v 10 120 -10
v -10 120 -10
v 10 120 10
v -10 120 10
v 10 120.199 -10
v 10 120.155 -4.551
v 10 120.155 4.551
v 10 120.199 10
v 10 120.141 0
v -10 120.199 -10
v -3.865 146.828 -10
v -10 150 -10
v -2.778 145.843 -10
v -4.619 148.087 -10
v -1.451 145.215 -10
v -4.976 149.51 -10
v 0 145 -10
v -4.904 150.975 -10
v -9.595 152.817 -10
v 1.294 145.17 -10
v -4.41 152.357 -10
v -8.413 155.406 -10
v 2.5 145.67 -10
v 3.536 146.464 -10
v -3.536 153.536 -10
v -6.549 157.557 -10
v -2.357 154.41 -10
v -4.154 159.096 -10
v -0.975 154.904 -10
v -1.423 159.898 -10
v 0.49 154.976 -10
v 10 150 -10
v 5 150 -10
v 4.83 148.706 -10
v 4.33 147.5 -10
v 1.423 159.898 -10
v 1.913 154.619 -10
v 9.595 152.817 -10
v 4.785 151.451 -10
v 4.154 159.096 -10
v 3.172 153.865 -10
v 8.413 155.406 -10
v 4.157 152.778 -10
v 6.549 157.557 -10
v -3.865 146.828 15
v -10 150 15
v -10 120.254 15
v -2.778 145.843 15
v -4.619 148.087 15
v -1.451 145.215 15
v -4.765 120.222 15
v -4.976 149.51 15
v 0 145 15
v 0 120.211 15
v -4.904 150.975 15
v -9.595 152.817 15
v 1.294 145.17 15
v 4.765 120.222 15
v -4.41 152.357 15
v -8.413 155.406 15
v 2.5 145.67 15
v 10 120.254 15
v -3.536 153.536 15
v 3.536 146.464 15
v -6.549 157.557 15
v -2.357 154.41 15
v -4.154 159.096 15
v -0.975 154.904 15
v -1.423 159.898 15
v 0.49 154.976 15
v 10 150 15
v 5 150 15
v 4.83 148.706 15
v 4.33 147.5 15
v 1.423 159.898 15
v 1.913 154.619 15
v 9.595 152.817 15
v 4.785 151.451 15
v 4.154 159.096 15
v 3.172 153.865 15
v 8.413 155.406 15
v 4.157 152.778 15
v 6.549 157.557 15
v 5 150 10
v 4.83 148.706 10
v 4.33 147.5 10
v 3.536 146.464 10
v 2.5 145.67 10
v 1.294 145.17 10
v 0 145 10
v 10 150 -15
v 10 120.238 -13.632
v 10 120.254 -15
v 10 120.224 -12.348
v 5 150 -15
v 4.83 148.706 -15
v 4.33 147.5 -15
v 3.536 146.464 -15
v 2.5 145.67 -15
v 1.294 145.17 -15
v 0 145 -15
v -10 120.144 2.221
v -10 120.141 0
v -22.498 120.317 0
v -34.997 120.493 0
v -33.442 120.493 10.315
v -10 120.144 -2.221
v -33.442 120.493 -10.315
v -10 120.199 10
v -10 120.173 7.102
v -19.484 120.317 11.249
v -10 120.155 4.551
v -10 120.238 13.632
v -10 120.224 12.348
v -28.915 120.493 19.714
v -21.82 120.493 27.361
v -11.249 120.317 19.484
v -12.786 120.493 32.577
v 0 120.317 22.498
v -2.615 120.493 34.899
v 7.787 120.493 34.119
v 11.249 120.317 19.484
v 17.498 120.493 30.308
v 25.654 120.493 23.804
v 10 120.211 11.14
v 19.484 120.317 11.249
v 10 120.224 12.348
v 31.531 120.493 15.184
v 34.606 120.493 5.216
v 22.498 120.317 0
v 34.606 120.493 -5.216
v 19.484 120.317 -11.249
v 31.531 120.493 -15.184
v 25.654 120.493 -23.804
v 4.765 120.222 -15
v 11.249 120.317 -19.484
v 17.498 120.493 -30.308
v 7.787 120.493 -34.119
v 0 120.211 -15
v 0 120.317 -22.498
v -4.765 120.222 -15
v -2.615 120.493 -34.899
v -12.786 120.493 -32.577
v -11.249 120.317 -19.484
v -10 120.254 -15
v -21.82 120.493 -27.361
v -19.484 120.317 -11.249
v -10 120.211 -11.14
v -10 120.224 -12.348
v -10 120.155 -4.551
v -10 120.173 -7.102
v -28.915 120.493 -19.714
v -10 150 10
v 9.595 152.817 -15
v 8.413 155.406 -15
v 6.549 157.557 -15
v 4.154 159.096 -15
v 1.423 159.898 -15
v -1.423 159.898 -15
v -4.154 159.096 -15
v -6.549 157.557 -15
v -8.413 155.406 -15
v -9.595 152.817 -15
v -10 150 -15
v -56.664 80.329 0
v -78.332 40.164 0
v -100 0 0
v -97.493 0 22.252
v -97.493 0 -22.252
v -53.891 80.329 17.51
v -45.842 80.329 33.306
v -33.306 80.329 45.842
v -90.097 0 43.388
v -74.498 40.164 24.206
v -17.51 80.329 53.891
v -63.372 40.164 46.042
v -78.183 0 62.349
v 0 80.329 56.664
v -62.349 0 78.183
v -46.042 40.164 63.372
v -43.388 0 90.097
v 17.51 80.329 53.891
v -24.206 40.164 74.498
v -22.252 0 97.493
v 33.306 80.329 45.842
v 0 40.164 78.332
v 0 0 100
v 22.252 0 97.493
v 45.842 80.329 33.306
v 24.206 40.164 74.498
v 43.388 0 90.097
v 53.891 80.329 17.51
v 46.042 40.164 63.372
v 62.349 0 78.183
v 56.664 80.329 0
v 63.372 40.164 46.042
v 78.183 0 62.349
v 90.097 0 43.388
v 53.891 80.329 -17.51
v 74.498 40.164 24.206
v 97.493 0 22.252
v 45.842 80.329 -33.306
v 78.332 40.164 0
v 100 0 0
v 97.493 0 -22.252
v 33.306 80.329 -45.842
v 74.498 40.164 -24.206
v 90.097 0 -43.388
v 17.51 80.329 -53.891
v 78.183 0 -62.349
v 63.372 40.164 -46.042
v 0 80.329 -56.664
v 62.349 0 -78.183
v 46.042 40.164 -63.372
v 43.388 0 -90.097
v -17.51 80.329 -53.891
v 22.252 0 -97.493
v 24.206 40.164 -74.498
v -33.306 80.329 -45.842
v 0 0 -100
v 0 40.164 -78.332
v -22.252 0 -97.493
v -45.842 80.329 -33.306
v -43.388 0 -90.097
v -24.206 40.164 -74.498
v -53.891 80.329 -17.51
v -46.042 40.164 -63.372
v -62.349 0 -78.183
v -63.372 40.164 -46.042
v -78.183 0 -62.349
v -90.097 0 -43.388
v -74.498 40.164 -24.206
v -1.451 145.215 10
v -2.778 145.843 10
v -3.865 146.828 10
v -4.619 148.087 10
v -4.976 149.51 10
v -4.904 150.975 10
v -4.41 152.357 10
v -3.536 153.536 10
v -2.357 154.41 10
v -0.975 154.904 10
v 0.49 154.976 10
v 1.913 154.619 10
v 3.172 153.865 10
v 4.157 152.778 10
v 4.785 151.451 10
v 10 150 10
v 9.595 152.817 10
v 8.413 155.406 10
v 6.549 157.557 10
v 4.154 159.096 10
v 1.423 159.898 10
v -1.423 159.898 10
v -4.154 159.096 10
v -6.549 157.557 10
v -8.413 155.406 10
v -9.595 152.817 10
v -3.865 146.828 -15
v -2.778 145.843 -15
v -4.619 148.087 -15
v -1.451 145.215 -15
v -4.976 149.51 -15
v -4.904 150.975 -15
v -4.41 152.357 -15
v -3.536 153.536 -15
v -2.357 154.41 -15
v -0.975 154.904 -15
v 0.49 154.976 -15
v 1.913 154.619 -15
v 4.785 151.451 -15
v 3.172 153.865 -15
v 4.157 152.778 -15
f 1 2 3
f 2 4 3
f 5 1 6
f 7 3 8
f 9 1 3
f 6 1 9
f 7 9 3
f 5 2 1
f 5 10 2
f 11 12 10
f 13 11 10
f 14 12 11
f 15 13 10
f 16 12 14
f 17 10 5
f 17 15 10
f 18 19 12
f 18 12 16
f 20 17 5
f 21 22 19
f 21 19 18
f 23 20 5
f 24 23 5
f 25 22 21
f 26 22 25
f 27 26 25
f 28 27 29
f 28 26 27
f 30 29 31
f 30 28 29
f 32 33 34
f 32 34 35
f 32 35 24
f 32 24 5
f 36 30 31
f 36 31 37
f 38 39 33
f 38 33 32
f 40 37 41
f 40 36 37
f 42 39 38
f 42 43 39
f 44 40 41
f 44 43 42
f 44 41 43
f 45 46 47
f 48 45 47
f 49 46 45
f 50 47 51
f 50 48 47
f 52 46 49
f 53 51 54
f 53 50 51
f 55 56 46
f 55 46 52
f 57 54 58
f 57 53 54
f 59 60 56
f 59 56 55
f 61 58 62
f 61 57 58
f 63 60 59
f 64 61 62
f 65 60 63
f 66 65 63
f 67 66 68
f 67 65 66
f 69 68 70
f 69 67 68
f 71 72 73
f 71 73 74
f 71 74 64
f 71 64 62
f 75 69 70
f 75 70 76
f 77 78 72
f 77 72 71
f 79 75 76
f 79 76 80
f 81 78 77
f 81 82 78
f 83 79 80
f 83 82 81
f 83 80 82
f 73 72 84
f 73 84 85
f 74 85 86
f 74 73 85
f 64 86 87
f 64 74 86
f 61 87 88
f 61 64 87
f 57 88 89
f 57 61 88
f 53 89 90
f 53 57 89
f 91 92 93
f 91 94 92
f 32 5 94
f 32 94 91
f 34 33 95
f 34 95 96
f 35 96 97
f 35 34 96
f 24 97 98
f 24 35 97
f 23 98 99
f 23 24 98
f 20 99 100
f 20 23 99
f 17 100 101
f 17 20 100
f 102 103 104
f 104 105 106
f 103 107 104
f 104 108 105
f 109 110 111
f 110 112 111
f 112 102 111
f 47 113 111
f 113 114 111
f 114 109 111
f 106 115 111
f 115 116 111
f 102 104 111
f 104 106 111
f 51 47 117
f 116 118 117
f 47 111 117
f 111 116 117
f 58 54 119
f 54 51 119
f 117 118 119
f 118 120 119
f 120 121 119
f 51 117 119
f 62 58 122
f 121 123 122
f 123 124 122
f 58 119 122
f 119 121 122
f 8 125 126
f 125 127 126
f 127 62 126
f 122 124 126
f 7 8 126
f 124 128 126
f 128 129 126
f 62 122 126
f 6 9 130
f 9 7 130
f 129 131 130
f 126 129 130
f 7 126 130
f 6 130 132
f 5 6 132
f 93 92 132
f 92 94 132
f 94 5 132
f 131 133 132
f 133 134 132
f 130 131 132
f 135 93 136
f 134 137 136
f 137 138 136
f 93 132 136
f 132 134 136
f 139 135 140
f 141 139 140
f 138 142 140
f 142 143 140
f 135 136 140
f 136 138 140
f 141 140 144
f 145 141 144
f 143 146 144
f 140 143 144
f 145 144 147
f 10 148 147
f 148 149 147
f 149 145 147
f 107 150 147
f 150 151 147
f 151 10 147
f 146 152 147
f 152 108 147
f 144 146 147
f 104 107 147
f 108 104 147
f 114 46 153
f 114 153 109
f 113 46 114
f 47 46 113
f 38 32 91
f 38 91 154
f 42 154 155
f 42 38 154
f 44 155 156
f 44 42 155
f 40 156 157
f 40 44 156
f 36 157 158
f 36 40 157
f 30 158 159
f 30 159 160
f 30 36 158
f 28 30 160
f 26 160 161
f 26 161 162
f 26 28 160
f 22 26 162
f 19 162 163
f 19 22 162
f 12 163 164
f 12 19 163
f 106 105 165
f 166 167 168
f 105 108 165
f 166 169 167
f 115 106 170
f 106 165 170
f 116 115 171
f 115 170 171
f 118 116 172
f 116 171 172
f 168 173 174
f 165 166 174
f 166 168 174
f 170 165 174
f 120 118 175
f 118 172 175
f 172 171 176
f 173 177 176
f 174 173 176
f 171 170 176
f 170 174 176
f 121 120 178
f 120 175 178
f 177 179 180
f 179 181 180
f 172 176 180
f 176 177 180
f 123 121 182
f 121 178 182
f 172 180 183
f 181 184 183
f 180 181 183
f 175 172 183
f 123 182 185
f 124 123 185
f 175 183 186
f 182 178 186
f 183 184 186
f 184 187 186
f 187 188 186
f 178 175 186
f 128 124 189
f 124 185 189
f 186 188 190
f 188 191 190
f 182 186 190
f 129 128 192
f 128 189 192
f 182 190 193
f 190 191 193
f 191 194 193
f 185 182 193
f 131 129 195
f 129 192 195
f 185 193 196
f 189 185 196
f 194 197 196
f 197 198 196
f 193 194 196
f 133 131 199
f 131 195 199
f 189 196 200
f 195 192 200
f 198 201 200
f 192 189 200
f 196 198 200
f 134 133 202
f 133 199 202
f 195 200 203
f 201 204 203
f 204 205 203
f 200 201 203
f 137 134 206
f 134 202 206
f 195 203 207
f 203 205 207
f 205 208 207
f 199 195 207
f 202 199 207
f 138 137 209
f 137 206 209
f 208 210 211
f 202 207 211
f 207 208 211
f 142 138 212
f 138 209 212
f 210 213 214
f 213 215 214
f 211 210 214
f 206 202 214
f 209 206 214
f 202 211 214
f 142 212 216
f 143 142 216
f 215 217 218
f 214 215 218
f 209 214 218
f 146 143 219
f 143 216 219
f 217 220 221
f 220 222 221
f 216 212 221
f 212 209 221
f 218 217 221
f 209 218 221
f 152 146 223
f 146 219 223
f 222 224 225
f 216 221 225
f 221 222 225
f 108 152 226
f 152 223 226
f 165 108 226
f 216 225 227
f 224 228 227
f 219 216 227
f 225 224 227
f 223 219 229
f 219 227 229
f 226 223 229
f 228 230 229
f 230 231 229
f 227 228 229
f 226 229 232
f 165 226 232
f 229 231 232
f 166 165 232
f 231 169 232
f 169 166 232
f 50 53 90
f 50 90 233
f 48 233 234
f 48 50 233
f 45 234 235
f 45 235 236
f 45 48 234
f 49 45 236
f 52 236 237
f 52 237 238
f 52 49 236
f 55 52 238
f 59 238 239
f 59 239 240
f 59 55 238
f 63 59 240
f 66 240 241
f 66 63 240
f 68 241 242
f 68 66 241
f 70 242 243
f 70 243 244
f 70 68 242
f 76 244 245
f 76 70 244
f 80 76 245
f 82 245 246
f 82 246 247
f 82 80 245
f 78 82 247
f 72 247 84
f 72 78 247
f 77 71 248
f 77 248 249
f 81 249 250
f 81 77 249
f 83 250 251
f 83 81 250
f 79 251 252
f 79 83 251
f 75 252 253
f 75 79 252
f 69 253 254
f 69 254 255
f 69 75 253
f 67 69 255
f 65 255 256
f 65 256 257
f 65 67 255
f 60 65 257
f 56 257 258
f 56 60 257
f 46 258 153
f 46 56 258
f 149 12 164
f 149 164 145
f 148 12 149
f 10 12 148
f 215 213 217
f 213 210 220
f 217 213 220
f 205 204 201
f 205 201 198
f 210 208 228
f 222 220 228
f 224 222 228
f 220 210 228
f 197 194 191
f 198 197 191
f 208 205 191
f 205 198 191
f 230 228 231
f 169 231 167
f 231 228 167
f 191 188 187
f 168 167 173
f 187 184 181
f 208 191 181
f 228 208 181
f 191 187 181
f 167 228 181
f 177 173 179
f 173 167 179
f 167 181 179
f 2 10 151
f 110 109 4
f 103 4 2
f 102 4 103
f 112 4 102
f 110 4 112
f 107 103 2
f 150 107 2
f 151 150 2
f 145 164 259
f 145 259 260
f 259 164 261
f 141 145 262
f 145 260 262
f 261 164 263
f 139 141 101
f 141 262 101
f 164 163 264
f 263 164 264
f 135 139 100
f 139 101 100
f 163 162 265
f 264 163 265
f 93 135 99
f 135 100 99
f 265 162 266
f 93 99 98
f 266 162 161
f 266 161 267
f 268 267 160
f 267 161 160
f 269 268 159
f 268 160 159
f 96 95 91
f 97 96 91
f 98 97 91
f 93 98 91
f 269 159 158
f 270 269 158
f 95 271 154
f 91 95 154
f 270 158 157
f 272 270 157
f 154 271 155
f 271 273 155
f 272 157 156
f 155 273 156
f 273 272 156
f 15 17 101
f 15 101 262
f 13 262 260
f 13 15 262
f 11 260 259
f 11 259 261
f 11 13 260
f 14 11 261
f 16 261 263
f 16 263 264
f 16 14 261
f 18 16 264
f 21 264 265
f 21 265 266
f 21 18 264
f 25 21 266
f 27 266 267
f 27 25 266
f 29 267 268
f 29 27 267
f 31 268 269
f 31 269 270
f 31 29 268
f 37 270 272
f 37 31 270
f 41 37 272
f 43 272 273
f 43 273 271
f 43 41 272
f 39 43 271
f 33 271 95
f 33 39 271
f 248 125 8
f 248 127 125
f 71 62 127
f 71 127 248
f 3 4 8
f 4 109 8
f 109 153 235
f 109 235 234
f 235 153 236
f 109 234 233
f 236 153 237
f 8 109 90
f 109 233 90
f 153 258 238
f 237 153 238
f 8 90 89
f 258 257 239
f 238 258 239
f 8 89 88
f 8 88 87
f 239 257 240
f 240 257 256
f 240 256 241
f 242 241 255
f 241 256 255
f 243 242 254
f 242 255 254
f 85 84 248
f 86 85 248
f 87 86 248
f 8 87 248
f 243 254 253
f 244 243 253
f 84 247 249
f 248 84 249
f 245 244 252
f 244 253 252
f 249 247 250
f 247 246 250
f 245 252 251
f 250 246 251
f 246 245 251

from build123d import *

# Parameters (mm, degrees)
F3_DEPTH = 15
F5_DEPTH = 10


with BuildPart() as f1:
    # F0 (on Top) → F1 (revolve)
    with BuildSketch(Plane.XY):
        Polygon((-100, 0), (0, 0), (0, 120), (-34.996529, 120.492912), align=None)
    revolve(axis=Axis((0, 60, 0), (0, 1, 0)))

    # F2 (on Top) → F3 (join, symmetric)
    with BuildSketch(Plane.XY):
        with BuildLine():
            ThreePointArc((5, 150), (-3.535534, 153.535534), (0, 145))
            ThreePointArc((0, 145), (3.535534, 146.464466), (5, 150))
        make_face()
        with BuildLine():
            Line((-10, 120), (0, 120))
            Line((0, 120), (10, 120))
            Line((10, 120), (10, 150))
            ThreePointArc((10, 150), (0, 160), (-10, 150))
            Line((-10, 150), (-10, 120))
        make_face()
        with BuildLine():
            ThreePointArc((5, 150), (3.535534, 146.464466), (0, 145))
            ThreePointArc((0, 145), (-3.535534, 153.535534), (5, 150))
        make_face(mode=Mode.SUBTRACT)
    extrude(amount=F3_DEPTH, both=True)

    # F4 (on Top) → F5 (cut, symmetric)
    with BuildSketch(Plane.XY):
        with BuildLine():
            ThreePointArc((5, 150), (-3.535534, 153.535534), (0, 145))
            ThreePointArc((0, 145), (3.535534, 146.464466), (5, 150))
        make_face()
        with BuildLine():
            Line((-10, 120), (0, 120))
            Line((0, 120), (10, 120))
            Line((10, 120), (10, 150))
            ThreePointArc((10, 150), (0, 160), (-10, 150))
            Line((-10, 150), (-10, 120))
        make_face()
        with BuildLine():
            ThreePointArc((5, 150), (3.535534, 146.464466), (0, 145))
            ThreePointArc((0, 145), (-3.535534, 153.535534), (5, 150))
        make_face(mode=Mode.SUBTRACT)
    extrude(amount=F5_DEPTH, both=True, mode=Mode.SUBTRACT)


solid = f1.part
